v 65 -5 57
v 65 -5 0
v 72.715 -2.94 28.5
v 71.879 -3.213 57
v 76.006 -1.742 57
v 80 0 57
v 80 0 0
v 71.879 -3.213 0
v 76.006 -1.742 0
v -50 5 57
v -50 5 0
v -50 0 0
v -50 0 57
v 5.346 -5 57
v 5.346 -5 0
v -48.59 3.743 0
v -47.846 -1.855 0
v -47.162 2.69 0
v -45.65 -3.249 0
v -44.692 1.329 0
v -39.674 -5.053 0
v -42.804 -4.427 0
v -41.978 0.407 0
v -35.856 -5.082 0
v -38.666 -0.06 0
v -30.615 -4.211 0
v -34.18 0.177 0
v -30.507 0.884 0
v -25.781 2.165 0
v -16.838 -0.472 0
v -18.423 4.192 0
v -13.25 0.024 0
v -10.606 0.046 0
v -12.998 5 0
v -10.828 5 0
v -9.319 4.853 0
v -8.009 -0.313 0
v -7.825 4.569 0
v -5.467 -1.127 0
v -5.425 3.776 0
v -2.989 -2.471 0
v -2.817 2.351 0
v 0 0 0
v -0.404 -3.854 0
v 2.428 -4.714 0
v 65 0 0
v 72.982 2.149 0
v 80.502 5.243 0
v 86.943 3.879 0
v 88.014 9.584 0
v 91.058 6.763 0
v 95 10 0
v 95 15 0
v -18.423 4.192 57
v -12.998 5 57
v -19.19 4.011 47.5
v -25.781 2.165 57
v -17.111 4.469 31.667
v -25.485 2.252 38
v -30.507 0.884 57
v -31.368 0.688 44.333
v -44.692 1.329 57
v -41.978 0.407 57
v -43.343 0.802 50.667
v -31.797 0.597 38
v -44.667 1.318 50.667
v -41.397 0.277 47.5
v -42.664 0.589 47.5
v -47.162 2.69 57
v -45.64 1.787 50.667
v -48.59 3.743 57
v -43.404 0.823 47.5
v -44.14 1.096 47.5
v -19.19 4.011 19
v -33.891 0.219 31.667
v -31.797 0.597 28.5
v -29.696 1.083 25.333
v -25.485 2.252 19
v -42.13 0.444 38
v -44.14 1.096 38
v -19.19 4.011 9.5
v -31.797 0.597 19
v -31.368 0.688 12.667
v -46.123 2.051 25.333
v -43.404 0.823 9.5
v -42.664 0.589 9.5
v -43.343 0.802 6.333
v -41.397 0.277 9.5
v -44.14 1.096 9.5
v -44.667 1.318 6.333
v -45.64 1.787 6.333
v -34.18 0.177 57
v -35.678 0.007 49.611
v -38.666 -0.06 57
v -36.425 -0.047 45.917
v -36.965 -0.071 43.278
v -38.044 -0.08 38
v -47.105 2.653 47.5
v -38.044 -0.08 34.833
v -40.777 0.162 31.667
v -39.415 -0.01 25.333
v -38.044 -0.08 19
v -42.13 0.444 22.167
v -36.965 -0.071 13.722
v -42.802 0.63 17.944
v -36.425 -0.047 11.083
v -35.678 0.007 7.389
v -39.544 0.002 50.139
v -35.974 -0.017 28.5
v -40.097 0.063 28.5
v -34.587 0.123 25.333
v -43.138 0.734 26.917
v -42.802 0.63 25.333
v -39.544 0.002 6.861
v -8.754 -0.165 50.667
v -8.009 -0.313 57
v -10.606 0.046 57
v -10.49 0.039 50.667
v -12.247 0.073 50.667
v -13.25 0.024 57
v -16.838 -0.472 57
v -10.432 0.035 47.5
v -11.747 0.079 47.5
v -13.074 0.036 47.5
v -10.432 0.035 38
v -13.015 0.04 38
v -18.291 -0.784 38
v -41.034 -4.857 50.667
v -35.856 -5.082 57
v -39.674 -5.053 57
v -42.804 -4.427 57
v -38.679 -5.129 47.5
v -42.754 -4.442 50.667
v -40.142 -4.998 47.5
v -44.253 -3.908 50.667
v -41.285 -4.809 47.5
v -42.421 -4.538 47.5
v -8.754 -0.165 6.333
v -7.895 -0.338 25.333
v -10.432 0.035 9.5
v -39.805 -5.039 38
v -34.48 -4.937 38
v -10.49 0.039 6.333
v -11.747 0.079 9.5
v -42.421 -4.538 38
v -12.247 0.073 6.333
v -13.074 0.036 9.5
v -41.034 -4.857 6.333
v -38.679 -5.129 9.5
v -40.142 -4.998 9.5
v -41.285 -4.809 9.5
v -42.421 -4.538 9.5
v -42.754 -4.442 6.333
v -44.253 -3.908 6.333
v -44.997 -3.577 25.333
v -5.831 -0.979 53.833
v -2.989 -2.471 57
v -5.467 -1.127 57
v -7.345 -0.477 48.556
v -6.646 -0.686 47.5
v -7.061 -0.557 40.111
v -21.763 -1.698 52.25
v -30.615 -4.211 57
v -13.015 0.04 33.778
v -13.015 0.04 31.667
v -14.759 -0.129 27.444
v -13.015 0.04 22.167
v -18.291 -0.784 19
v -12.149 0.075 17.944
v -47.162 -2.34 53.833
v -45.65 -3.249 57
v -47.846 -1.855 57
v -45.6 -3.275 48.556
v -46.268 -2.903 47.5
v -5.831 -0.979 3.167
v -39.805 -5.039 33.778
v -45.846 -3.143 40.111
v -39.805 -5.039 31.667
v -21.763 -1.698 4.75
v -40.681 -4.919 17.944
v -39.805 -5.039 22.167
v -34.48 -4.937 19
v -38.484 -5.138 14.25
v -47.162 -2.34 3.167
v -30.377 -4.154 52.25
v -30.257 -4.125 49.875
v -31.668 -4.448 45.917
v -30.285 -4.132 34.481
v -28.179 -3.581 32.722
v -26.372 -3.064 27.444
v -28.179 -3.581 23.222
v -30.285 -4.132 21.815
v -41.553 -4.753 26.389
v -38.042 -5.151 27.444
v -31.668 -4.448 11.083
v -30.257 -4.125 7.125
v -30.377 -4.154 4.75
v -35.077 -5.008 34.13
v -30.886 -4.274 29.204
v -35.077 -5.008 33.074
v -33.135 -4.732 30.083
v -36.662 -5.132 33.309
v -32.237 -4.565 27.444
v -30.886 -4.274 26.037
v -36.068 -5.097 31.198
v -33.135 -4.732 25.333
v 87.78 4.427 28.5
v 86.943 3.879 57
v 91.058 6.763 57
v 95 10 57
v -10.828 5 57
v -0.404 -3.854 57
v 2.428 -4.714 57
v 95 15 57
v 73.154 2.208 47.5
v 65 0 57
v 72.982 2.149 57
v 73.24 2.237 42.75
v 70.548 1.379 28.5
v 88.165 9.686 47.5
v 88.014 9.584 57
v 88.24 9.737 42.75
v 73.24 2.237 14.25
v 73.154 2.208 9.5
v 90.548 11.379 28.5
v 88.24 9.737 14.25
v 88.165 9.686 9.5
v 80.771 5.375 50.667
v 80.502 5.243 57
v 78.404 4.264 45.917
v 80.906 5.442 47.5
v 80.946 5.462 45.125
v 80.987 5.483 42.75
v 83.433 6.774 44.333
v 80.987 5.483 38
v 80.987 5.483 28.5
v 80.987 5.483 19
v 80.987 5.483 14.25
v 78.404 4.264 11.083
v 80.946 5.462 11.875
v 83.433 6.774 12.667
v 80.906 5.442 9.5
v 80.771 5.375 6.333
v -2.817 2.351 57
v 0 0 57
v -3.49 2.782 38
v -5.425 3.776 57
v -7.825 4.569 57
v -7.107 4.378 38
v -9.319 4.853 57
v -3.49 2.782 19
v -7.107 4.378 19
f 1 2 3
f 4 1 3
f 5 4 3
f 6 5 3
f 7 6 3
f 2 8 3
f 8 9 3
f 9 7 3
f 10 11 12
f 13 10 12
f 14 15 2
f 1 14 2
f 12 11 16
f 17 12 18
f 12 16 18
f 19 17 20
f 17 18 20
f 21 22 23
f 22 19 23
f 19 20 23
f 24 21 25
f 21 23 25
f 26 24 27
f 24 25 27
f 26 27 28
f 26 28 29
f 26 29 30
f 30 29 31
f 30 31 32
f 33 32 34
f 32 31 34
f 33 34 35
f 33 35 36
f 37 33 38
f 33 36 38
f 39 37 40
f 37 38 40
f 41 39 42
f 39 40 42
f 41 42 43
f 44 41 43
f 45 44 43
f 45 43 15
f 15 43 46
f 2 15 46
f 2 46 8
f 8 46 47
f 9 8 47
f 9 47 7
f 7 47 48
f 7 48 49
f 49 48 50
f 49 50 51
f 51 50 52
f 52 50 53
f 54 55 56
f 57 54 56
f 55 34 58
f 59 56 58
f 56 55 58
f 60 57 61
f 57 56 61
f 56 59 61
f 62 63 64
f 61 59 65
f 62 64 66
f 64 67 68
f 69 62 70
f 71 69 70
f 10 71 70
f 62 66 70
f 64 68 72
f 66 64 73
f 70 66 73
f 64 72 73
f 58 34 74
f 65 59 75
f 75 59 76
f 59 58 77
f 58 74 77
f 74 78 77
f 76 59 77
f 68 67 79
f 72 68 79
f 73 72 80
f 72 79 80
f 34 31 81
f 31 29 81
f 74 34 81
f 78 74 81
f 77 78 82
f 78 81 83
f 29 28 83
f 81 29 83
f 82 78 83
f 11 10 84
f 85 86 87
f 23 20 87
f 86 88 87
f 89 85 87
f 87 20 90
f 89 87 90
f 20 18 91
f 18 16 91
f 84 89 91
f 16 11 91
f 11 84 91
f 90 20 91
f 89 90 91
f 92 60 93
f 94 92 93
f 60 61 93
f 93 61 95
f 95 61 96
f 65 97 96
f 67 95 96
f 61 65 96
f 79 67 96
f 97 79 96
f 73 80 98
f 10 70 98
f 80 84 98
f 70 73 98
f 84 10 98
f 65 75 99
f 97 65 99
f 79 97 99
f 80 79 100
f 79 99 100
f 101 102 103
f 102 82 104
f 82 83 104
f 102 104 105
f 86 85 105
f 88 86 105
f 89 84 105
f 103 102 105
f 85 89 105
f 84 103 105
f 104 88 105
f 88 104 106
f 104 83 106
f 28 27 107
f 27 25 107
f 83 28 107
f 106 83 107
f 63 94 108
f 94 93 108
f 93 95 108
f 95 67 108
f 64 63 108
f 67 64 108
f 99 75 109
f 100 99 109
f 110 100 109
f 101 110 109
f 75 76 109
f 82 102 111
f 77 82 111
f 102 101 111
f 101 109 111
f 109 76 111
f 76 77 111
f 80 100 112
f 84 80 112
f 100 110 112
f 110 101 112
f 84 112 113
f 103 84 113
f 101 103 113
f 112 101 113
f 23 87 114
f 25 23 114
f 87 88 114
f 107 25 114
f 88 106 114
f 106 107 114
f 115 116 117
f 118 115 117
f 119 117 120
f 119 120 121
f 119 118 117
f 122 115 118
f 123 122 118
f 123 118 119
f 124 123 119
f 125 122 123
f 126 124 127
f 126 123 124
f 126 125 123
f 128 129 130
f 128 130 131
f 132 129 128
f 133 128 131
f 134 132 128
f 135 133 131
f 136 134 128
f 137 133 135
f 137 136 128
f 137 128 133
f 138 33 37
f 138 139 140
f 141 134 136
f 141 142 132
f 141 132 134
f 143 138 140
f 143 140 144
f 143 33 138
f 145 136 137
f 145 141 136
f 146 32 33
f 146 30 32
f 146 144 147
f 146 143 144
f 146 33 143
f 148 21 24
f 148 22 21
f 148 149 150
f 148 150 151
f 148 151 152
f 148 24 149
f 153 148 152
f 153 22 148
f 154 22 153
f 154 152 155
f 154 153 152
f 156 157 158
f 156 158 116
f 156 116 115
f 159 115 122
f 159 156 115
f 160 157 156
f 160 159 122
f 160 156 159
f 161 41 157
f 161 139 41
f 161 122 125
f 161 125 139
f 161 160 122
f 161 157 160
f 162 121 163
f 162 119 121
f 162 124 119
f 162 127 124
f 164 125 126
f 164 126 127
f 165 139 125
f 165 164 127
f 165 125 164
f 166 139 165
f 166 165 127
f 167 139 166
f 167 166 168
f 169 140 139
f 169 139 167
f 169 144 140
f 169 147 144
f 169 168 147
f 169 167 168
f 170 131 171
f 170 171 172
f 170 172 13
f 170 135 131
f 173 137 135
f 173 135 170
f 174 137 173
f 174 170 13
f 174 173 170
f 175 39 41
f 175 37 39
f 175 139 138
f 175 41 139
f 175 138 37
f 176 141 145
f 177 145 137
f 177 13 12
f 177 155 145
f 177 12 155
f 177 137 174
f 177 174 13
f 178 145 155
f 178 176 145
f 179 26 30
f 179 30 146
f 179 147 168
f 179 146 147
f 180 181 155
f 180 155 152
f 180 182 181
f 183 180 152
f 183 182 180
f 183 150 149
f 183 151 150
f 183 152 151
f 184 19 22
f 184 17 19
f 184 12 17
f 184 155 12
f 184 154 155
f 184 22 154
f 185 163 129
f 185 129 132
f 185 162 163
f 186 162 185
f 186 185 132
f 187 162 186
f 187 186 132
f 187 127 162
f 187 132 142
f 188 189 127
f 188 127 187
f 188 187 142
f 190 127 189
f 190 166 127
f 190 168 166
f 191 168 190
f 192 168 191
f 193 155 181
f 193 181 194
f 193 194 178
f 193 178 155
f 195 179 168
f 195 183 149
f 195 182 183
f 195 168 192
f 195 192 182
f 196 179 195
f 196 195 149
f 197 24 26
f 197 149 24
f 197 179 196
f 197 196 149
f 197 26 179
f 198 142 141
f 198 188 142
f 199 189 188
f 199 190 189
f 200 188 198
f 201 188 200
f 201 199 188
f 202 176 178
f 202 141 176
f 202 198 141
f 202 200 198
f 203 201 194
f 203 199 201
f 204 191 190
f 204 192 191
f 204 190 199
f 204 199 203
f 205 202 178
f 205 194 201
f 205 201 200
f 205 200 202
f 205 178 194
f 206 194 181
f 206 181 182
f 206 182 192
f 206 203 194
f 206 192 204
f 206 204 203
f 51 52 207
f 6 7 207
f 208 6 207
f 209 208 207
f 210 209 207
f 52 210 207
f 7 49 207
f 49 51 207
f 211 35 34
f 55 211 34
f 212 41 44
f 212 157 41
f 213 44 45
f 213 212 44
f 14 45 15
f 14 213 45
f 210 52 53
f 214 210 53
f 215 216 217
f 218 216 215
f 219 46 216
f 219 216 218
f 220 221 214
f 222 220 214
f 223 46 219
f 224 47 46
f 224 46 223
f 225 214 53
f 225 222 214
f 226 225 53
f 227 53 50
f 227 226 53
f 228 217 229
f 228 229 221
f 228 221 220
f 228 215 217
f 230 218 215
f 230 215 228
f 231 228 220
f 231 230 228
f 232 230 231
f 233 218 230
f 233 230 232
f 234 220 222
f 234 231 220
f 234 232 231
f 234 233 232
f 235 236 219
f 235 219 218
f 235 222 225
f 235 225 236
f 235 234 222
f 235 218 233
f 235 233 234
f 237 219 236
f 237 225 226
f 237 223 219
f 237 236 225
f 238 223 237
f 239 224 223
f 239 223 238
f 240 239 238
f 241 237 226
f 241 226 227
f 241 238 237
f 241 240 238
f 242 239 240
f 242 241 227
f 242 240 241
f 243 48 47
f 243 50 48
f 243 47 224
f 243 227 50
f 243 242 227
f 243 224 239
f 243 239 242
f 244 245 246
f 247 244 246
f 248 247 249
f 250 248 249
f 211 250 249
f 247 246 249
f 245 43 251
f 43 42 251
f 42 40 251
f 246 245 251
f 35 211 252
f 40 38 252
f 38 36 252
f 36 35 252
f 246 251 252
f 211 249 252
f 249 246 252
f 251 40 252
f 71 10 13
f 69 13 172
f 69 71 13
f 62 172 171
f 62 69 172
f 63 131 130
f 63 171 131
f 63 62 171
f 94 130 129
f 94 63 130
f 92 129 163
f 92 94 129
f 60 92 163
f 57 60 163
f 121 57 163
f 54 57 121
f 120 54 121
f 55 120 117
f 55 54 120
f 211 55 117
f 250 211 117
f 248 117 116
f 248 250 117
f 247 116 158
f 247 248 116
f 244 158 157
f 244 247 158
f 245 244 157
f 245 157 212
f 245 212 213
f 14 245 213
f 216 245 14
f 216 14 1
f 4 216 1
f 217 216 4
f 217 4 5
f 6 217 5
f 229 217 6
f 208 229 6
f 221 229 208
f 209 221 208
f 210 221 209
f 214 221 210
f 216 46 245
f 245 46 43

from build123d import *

# Parameters (mm, degrees)
BOSS_EXTRUDE1_DEPTH = 57
FILLET1_R           = 15


with BuildPart() as part:
    # Sketch1 → Boss-Extrude1 (new body)
    with BuildSketch(Plane.XY):
        with BuildLine():
            Line((65, 0), (0, 0))
            add(Edge.make_bspline(
                [(0, 0), (-3.420787062, 3.445195102), (-7.060889651, 4.793606126), (-10.827974412, 5)],
                knots=[0, 0, 0, 0, 0.227402819, 0.227402819, 0.227402819, 0.227402819], degree=3))
            Line((-10.827974412, 5), (-12.998410552, 5))
            add(Edge.make_bspline(
                [(-12.998410552, 5), (-25.222609251, 4.375360382), (-38.571253465, -6.117915944), (-50, 5)],
                knots=[0.270809768, 0.270809768, 0.270809768, 0.270809768, 1, 1, 1, 1], degree=3))
            Line((-50, 5), (-50, 0))
            add(Edge.make_bspline(
                [(0, -5), (-14.762430124, 10.348316204), (-34.295343775, -15.48284378), (-50, 0)],
                knots=[0, 0, 0, 0, 1, 1, 1, 1], degree=3))
            Line((0, -5), (65, -5))
            Line((65, -5), (65, 0))
        make_face()
        with BuildLine():
            Line((80, 0), (65, 0))
            Line((65, 0), (65, -5))
            add(Edge.make_bspline(
                [(65, -5), (72.93083611, -3.380904469), (80, 0)],
                knots=[0, 0, 0, 0.467251417, 0.467251417, 0.467251417], degree=2))
        make_face()
        with BuildLine():
            add(Edge.make_bspline(
                [(65, 0), (81.973380543, 3.465148466), (95, 15)],
                knots=[0, 0, 0, 1, 1, 1], degree=2))
            Line((65, 0), (80, 0))
            add(Edge.make_bspline(
                [(80, 0), (88.060086943, 3.85482419), (95, 10)],
                knots=[0.467251417, 0.467251417, 0.467251417, 1, 1, 1], degree=2))
            Line((95, 10), (95, 15))
        make_face()
    extrude(amount=BOSS_EXTRUDE1_DEPTH)

    # Fillet1
    fillet1_edges = [part.edges().sort_by_distance(p)[0] for p in [
        (0, -5, 28.5),
    ]]
    fillet(fillet1_edges, radius=FILLET1_R)


solid = part.part
